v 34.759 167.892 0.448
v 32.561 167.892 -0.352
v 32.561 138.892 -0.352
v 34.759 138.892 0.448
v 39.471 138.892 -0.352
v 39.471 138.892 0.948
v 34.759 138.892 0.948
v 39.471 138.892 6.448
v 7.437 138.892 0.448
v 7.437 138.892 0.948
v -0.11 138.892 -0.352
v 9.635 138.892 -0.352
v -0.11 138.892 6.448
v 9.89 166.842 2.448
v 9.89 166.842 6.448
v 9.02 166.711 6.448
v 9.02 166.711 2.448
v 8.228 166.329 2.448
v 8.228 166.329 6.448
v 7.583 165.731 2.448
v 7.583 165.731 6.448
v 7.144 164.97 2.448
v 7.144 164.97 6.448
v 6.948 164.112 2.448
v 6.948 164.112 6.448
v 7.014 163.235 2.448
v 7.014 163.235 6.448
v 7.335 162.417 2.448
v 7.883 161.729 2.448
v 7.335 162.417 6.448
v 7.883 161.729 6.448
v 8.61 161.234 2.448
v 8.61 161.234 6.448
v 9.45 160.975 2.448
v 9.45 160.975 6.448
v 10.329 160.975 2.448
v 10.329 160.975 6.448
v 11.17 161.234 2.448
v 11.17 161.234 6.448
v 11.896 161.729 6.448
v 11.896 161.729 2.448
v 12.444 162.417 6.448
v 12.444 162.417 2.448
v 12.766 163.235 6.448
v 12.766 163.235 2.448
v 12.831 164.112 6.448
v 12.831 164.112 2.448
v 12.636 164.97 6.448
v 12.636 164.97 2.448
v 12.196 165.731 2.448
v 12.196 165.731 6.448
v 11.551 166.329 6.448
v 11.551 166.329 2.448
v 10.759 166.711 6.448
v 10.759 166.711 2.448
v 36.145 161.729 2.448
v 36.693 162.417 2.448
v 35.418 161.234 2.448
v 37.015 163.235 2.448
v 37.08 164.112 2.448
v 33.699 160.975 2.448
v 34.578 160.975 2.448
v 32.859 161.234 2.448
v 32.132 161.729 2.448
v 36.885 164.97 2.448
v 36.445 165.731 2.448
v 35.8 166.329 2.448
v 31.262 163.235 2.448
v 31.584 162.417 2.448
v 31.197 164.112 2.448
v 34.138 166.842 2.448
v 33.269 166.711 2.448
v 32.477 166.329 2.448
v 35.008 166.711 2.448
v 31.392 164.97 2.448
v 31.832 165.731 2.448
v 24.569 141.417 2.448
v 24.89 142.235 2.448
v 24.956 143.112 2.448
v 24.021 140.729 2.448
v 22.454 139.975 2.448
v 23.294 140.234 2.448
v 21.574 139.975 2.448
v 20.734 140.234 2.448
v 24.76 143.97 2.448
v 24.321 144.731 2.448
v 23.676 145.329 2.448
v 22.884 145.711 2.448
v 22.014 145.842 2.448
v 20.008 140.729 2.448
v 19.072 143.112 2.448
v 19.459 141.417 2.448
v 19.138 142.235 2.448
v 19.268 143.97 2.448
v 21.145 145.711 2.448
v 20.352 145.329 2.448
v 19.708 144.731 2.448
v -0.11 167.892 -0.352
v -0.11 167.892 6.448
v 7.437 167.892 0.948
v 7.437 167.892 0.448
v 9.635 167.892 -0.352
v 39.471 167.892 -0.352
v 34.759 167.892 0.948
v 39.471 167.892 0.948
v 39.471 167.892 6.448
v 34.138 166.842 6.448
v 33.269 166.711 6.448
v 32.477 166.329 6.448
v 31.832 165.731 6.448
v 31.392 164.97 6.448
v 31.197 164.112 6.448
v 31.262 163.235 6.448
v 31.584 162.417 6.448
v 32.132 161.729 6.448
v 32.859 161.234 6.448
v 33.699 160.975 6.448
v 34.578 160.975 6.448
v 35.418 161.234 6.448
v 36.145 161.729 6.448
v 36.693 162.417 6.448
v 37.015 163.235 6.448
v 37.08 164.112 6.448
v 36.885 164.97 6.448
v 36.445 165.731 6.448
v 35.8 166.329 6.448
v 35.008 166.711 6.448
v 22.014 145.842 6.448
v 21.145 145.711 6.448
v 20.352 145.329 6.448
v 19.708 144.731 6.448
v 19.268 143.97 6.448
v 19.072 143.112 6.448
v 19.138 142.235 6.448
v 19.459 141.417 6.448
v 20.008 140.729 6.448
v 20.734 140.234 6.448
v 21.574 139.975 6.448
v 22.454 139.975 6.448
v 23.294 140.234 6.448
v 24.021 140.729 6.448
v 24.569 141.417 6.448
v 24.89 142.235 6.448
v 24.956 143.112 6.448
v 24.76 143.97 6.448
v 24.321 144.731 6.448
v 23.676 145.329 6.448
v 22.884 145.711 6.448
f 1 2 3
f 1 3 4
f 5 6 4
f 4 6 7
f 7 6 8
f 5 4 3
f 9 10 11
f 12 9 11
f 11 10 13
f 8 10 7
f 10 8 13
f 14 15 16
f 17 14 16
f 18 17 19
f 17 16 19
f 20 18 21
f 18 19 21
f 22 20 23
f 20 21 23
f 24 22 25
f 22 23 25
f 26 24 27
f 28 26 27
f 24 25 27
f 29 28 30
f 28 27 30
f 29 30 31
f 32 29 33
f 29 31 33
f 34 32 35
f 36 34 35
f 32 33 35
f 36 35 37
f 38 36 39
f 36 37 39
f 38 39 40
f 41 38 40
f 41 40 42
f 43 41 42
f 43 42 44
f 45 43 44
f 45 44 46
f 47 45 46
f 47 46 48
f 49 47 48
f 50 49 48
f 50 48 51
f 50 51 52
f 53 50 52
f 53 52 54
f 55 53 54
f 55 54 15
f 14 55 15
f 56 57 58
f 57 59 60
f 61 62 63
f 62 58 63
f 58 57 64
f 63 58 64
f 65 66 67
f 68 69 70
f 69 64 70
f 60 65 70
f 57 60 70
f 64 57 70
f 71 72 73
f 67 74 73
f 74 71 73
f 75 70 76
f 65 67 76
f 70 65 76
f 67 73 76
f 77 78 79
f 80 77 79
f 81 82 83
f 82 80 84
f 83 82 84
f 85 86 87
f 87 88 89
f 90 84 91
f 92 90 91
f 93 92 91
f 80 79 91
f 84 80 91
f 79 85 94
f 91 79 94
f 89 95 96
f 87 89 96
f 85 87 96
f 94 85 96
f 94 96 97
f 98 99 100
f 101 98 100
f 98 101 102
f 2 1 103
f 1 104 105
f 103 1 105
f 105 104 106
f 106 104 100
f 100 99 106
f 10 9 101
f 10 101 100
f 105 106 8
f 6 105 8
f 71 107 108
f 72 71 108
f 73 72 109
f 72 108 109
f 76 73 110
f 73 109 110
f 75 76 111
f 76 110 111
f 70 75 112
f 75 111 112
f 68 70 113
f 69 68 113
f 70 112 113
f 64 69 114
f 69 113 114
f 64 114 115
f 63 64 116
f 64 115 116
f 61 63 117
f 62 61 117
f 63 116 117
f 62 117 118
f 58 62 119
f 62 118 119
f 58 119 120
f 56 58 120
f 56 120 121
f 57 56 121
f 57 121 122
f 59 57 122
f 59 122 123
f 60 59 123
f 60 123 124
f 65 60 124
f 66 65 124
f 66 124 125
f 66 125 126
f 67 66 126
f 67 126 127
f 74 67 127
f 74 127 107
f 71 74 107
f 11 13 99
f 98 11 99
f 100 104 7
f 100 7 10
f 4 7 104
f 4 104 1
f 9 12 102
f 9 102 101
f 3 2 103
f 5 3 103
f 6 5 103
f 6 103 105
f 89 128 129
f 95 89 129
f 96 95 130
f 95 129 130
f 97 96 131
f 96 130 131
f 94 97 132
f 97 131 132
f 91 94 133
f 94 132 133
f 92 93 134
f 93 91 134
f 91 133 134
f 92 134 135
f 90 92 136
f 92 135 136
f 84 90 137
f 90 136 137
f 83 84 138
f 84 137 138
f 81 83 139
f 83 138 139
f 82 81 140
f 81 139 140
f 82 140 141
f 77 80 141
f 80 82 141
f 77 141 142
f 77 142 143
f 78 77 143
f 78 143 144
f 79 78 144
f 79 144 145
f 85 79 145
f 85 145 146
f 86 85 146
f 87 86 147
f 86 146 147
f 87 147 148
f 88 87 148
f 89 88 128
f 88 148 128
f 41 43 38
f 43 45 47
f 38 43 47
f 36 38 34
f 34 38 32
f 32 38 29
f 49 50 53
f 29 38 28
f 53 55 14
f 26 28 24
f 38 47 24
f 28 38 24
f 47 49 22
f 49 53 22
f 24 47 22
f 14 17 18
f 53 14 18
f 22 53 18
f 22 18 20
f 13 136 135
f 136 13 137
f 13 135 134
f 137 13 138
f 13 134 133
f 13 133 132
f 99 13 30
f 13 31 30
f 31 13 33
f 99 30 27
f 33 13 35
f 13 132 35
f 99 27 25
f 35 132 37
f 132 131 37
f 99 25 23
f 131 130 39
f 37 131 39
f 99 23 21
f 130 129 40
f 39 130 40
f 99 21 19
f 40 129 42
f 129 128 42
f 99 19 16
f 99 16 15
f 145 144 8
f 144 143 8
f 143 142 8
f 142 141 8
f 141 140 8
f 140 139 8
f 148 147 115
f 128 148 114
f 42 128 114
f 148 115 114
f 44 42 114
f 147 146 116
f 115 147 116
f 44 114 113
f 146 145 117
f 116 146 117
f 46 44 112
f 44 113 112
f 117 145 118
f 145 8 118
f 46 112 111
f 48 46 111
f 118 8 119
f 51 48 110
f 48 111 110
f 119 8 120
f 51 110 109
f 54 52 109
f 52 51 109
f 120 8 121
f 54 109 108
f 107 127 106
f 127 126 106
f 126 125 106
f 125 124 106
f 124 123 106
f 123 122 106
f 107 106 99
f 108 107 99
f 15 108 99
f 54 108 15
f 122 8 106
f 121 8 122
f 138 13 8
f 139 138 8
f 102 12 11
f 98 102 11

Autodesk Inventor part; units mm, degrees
ref_plane "YZ Plane" through (0, 0, 0) normal (1, 0, 0) x (0, 1, 0)
ref_plane "XZ Plane" through (0, 0, 0) normal (0, 1, 0) x (-1, 0, 0)
ref_plane "XY Plane" through (0, 0, 0) normal (0, 0, 1) x (1, 0, 0)
ref_plane "Work Plane1" through (52.5141, 202.7033, 6.4479) normal (0, 0, -1) x (0, 1, 0)
sketch "Sketch1" plane through (52.5141, 202.7033, 6.4479) normal (0, 0, -1) x (0, 1, 0)
  circle A0 centre (-59.8114, -30.5) radius 1.4 construction
  circle A1 centre (-38.8114, -18.3756) radius 1.4 projected
  circle A2 centre (-38.8114, -42.6244) radius 1.4 construction
  circle A3 centre (41, 0) radius 1.65 projected
  circle A4 centre (-9, 0) radius 1.65 projected
  circle A5 centre (-9, 50) radius 1.65 projected
  circle A6 centre (41, 50) radius 1.65 projected
  circle A7 centre (16, 50) radius 1.65 projected
  circle A8 centre (-9, 25) radius 1.65 projected
  circle A9 centre (16, 0) radius 1.65 projected
  circle A10 centre (41, 25) radius 1.65 projected
  line L0 (80, 55) -> (-80, 55) projected
  line L1 (-80, 55) -> (-80, -55) projected
  line L2 (-80, -55) -> (80, -55) projected
  line L3 (80, -55) -> (80, 55) projected
  line L4 (-36.5, 0) -> (-36.5, -50) projected
  line L5 (-14, 0) -> (-36.5, 0) projected
  line L6 (-14, -5) -> (-14, 0) projected
  line L7 (72, -5) -> (-14, -5) projected
  line L8 (72, -50) -> (72, -5) projected
  line L9 (-36.5, -50) -> (72, -50) projected
  line L10 (-4, 45) -> (-4, 5) projected
  line L11 (36, 45) -> (-4, 45) projected
  line L12 (36, 5) -> (36, 45) projected
  line L13 (-4, 5) -> (36, 5) projected
  line L14 (-64.5989, -17.0433) -> (-64.5989, -57.0433) construction
  line L15 (-64.5989, -57.0433) -> (-34.5989, -57.0433) construction
  line L16 (-34.5989, -57.0433) -> (-34.5989, -17.0433) construction
  line L17 (-34.5989, -17.0433) -> (-64.5989, -17.0433) construction
  line L18 (-34.8114, -13.0433) -> (-63.8114, -13.0433)
  line L19 (-63.8114, -13.0433) -> (-63.8114, -52.6244)
  line L20 (-63.8114, -52.6244) -> (-34.8114, -52.6244)
  line L21 (-34.8114, -52.6244) -> (-34.8114, -13.0433)
  circle A11 centre (-59.8114, -30.5) radius 2.95
  circle A12 centre (-38.8114, -18.3756) radius 2.95
  circle A13 centre (-38.8114, -42.6244) radius 2.95 construction
  line L22 (-36.5, -35.1157) -> (-41.75, -35.1157) construction
  line L23 (-41.75, -35.1157) -> (-41.75, -38.5657) construction
  line L24 (-41.75, -38.5657) -> (-56.86, -38.5657) construction
  line L25 (-56.86, -38.5657) -> (-56.86, -35.1157) construction
  line L26 (-56.86, -35.1157) -> (-60.26, -35.1157) construction
  line L27 (-60.26, -35.1157) -> (-60.26, -52.0657) construction
  line L28 (-60.26, -52.0657) -> (-36.5, -52.0657) construction
  line L29 (-36.5, -52.0657) -> (-36.5, -35.1157) construction
  line L30 (-41.75, -28.3657) -> (-36.5, -28.3657) construction
  line L31 (-36.5, -28.3657) -> (-36.5, -25.0657) construction
  line L32 (-36.5, -25.0657) -> (-60.26, -25.0657) construction
  line L33 (-60.26, -25.0657) -> (-60.26, -28.3657) construction
  line L34 (-60.26, -28.3657) -> (-56.86, -28.3657) construction
  line L35 (-56.86, -28.3657) -> (-56.86, -27.0942) construction
  line L36 (-56.86, -27.0942) -> (-41.75, -27.0942) construction
  line L37 (-41.75, -27.0942) -> (-41.75, -28.3657) construction
  line L38 (-56.86, -35.1157) -> (-60.26, -35.1157) construction
  line L39 (-56.86, -38.5657) -> (-56.86, -35.1157) construction
  line L40 (-41.75, -38.5657) -> (-56.86, -38.5657) construction
  line L41 (-41.75, -35.1157) -> (-41.75, -38.5657) construction
  line L42 (-36.5, -35.1157) -> (-41.75, -35.1157) construction
  line L43 (-36.5, -35.05) -> (-36.5, -35.1157) construction
  line L44 (-36.5, -35.05) -> (-56.86, -35.05) construction
  line L45 (-36.5, -34.78) -> (-36.5, -35.05) construction
  line L46 (-36.5, -34.78) -> (-56.86, -34.78) construction
  line L47 (-36.5, -34.51) -> (-36.5, -34.78) construction
  line L48 (-36.5, -34.51) -> (-56.86, -34.51) construction
  line L49 (-36.5, -34.24) -> (-36.5, -34.51) construction
  line L50 (-36.5, -34.24) -> (-56.86, -34.24) construction
  line L51 (-36.5, -33.97) -> (-36.5, -34.24) construction
  line L52 (-36.5, -33.97) -> (-56.86, -33.97) construction
  line L53 (-36.5, -33.7) -> (-36.5, -33.97) construction
  line L54 (-36.5, -33.7) -> (-56.86, -33.7) construction
  line L55 (-36.5, -33.43) -> (-36.5, -33.7) construction
  line L56 (-36.5, -33.43) -> (-56.86, -33.43) construction
  line L57 (-36.5, -33.16) -> (-36.5, -33.43) construction
  line L58 (-36.5, -33.16) -> (-56.86, -33.16) construction
  line L59 (-36.5, -32.89) -> (-36.5, -33.16) construction
  line L60 (-36.5, -32.89) -> (-56.86, -32.89) construction
  line L61 (-36.5, -32.62) -> (-36.5, -32.89) construction
  line L62 (-36.5, -32.62) -> (-56.86, -32.62) construction
  line L63 (-36.5, -32.35) -> (-36.5, -32.62) construction
  line L64 (-36.5, -32.35) -> (-56.86, -32.35) construction
  line L65 (-36.5, -32.08) -> (-36.5, -32.35) construction
  line L66 (-36.5, -32.08) -> (-56.86, -32.08) construction
  line L67 (-36.5, -31.81) -> (-36.5, -32.08) construction
  line L68 (-36.5, -31.81) -> (-56.86, -31.81) construction
  line L69 (-36.5, -31.54) -> (-36.5, -31.81) construction
  line L70 (-36.5, -31.54) -> (-56.86, -31.54) construction
  line L71 (-36.5, -31.27) -> (-36.5, -31.54) construction
  line L72 (-36.5, -31.27) -> (-56.86, -31.27) construction
  line L73 (-36.5, -31) -> (-36.5, -31.27) construction
  line L74 (-36.5, -31) -> (-56.86, -31) construction
  line L75 (-36.5, -30.73) -> (-36.5, -31) construction
  line L76 (-36.5, -30.73) -> (-56.86, -30.73) construction
  line L77 (-36.5, -30.46) -> (-36.5, -30.73) construction
  line L78 (-36.5, -30.46) -> (-56.86, -30.46) construction
  line L79 (-36.5, -30.19) -> (-36.5, -30.46) construction
  line L80 (-36.5, -30.19) -> (-56.86, -30.19) construction
  line L81 (-36.5, -29.92) -> (-36.5, -30.19) construction
  line L82 (-36.5, -29.92) -> (-56.86, -29.92) construction
  line L83 (-36.5, -29.65) -> (-36.5, -29.92) construction
  line L84 (-36.5, -29.65) -> (-56.86, -29.65) construction
  line L85 (-36.5, -29.38) -> (-36.5, -29.65) construction
  line L86 (-36.5, -29.38) -> (-56.86, -29.38) construction
  line L87 (-36.5, -29.11) -> (-36.5, -29.38) construction
  line L88 (-36.5, -29.11) -> (-56.86, -29.11) construction
  line L89 (-36.5, -28.84) -> (-36.5, -29.11) construction
  line L90 (-36.5, -28.84) -> (-56.86, -28.84) construction
  line L91 (-36.5, -28.3657) -> (-36.5, -28.84) construction
  line L92 (-41.75, -28.3657) -> (-36.5, -28.3657) construction
  line L93 (-41.75, -27.0942) -> (-41.75, -28.3657) construction
  line L94 (-56.86, -27.0942) -> (-41.75, -27.0942) construction
  line L95 (-56.86, -28.3657) -> (-56.86, -27.0942) construction
  line L96 (-60.26, -28.3657) -> (-56.86, -28.3657) construction
  line L97 (-60.26, -35.1157) -> (-60.26, -28.3657) construction
  line L98 (-60.26, -25.0657) -> (-36.5, -25.0657) construction
  line L99 (-36.5, -25.0657) -> (-36.5, -52.0657) construction
  line L100 (-60.26, -52.0657) -> (-60.26, -25.0657) construction
  line L101 (-57.1632, -22.5233) -> (-33.4032, -22.5233) construction
  line L102 (-33.4032, -22.5233) -> (-33.4032, -49.5233) construction
  line L103 (-33.4032, -49.5233) -> (-57.1632, -49.5233) construction
  line L104 (-57.1632, -49.5233) -> (-57.1632, -22.5233) construction
  circle A14 centre (-38.8114, -42.6244) radius 2.95
  point P0 (-202.7033, -52.5141)
  point P1 (-56.7146, -27.9576)
  dimension "d0" = 4
  dimension "d2" = 4
  dimension "d3" = 4
  dimension "d4" = 5.9
  dimension "d5" = 5.9
  dimension "d6" = 5.9
  dimension "d10" = 10
extrude "Extrusion1" add sketch "Sketch1" along normal blind 4 contours L18 L21 L9 L4 A14 A12 | L4 A12 A14 L9 L21 L20 L19 L18
sketch "Sketch2" plane through (52.5141, 202.7033, 2.4479) normal (0, 0, -1) x (-1, 0, 0)
  circle A0 centre (42.6244, -38.8114) radius 2.95 projected
  circle A1 centre (18.3756, -38.8114) radius 2.95 projected
  circle A2 centre (30.5, -59.8114) radius 2.95 projected
  line L0 (13.0433, -34.8114) -> (13.0433, -63.8114) projected
  line L1 (13.0433, -63.8114) -> (52.6244, -63.8114) projected
  line L2 (52.6244, -63.8114) -> (52.6244, -34.8114) projected
  line L3 (52.6244, -34.8114) -> (13.0433, -34.8114) projected
  point P0 (52.5141, -202.7033)
extrude "Extrusion2" add sketch "Sketch2" along normal blind 1.5 contours A0 | A1 | A2 | L3 L2 L1 L0
sketch "Sketch3" plane through (-0.1103, 138.8919, 6.4479) normal (0, -1, 0) x (1, 0, 0)
  line L0 (39.581, 0) -> (0, 0) projected
  line L1 (0, 0) -> (0, -5.5) projected
  line L2 (39.581, -5.5) -> (0, -5.5) projected
  line L3 (39.581, 0) -> (39.581, -5.5) projected
  line L4 (17.5087, -7.4479) -> (17.5087, -6.8479) construction
  line L5 (17.5087, -6.8479) -> (24.2587, -6.8479) construction
  line L6 (24.2587, -6.8479) -> (24.2587, -7.4479) construction
  line L7 (27.5587, -7.4479) -> (24.2587, -7.4479) construction
  line L8 (27.5587, -6.4479) -> (27.5587, -7.4479) construction
  line L9 (27.5587, -6.4479) -> (0.5587, -6.4479) construction
  line L10 (0.5587, -6.4479) -> (0.5587, -7.4479) construction
  line L11 (17.5087, -7.4479) -> (0.5587, -7.4479) construction
  line L12 (39.581, 0) -> (39.581, -5.5) projected
  line L13 (39.581, -5.5) -> (34.8694, -5.5)
  line L14 (34.8694, -5.5) -> (34.8694, -6)
  line L15 (34.8694, -6.8) -> (39.581, -6.8)
  line L16 (39.581, -6.8) -> (39.581, -5.5)
  line L17 (39.581, -6.8) -> (32.6714, -6.8)
  line L18 (32.6714, -6.8) -> (34.8694, -6)
  line L19 (12.6726, -5.5) -> (12.6726, -6.5) projected
  line L20 (0, 0) -> (0, -5.5) projected
  line L21 (0, -5.5) -> (8.1109, -5.5)
  line L22 (8.1109, -6.8) -> (0, -6.8)
  line L23 (0, -6.8) -> (0, -5.5)
  line L24 (9.7457, -6.8) -> (8.1109, -6.8)
  line L25 (0, -5.5) -> (39.581, -5.5) projected
  line L26 (9.7457, -6.8) -> (7.5477, -6)
  line L27 (7.5477, -6) -> (7.5477, -5.5)
  line L28 (8.8457, -5.5) -> (33.4957, -5.5) construction
  line L29 (33.4957, -5.5) -> (33.4957, -6.5) construction
  line L30 (33.4957, -6.5) -> (8.8457, -6.5) construction
  line L31 (8.8457, -6.5) -> (8.8457, -5.5) construction
  point P0 (8.981, -5.5)
  dimension "d42" = 1.3
  dimension "d43" = 110
  dimension "d45" = 0.5
  dimension "d46" = 0.5
  dimension "d47" = 110
  dimension "d48" = 24.65
  dimension "d49" = 1
  dimension "d50" = 0.9
  dimension "d51" = 0
extrude "Extrusion3" add sketch "Sketch3" against normal up to surface (29 mm away) contours L16 L15 L17 L18 L14 L2 | L2 L27 L26 L24 L22 L23
sketch "Sketch6" plane through (52.5141, 202.7033, 6.4479) normal (0, 0, 1) x (1, 0, 0)
  line L0 (-13.0433, -34.8114) -> (-13.0433, -63.8114) projected
  line L1 (-52.6244, -34.8114) -> (-13.0433, -34.8114) projected
  line L2 (-52.6244, -63.8114) -> (-52.6244, -34.8114) projected
  line L3 (-13.0433, -63.8114) -> (-52.6244, -63.8114) projected
  line L4 (-23.5962, -45.8071) -> (-17.5454, -39.7563)
  line L5 (-17.5454, -39.7563) -> (-19.6668, -37.635)
  line L6 (-19.6668, -37.635) -> (-25.7175, -43.6858)
  line L7 (-25.7175, -43.6858) -> (-23.5962, -45.8071)
  line L8 (-23.5962, -45.8071) -> (-19.6668, -37.635) construction
  line L9 (-17.5454, -39.7563) -> (-25.7175, -43.6858) construction
  line L10 (-39.0797, -45.8071) -> (-43.9064, -40.9803)
  line L11 (-43.9064, -40.9803) -> (-41.7851, -38.859)
  line L12 (-41.7851, -38.859) -> (-36.9583, -43.6858)
  line L13 (-36.9583, -43.6858) -> (-39.0797, -45.8071)
  line L14 (-39.0797, -45.8071) -> (-41.7851, -38.859) construction
  line L15 (-43.9064, -40.9803) -> (-36.9583, -43.6858) construction
  line L16 (-25.7175, -43.6858) -> (-36.9583, -43.6858)
  line L17 (-23.5962, -45.8071) -> (-23.5962, -49.9899)
  line L18 (-23.5962, -49.9899) -> (-39.0797, -49.9899)
  line L19 (-39.0797, -49.9899) -> (-39.0797, -45.8071)
  point P0 (-52.5141, -202.7033)
  point P1 (-21.6315, -41.7211)
  point P2 (-40.4324, -42.333)
  dimension "d35" = 3
  dimension "d36" = 3
  dimension "d37" = 45
  dimension "d38" = 0
extrude "Extrusion6" [suppressed]
properties part number "cellSTORM_v5_chiptray_new_0_24.4"
